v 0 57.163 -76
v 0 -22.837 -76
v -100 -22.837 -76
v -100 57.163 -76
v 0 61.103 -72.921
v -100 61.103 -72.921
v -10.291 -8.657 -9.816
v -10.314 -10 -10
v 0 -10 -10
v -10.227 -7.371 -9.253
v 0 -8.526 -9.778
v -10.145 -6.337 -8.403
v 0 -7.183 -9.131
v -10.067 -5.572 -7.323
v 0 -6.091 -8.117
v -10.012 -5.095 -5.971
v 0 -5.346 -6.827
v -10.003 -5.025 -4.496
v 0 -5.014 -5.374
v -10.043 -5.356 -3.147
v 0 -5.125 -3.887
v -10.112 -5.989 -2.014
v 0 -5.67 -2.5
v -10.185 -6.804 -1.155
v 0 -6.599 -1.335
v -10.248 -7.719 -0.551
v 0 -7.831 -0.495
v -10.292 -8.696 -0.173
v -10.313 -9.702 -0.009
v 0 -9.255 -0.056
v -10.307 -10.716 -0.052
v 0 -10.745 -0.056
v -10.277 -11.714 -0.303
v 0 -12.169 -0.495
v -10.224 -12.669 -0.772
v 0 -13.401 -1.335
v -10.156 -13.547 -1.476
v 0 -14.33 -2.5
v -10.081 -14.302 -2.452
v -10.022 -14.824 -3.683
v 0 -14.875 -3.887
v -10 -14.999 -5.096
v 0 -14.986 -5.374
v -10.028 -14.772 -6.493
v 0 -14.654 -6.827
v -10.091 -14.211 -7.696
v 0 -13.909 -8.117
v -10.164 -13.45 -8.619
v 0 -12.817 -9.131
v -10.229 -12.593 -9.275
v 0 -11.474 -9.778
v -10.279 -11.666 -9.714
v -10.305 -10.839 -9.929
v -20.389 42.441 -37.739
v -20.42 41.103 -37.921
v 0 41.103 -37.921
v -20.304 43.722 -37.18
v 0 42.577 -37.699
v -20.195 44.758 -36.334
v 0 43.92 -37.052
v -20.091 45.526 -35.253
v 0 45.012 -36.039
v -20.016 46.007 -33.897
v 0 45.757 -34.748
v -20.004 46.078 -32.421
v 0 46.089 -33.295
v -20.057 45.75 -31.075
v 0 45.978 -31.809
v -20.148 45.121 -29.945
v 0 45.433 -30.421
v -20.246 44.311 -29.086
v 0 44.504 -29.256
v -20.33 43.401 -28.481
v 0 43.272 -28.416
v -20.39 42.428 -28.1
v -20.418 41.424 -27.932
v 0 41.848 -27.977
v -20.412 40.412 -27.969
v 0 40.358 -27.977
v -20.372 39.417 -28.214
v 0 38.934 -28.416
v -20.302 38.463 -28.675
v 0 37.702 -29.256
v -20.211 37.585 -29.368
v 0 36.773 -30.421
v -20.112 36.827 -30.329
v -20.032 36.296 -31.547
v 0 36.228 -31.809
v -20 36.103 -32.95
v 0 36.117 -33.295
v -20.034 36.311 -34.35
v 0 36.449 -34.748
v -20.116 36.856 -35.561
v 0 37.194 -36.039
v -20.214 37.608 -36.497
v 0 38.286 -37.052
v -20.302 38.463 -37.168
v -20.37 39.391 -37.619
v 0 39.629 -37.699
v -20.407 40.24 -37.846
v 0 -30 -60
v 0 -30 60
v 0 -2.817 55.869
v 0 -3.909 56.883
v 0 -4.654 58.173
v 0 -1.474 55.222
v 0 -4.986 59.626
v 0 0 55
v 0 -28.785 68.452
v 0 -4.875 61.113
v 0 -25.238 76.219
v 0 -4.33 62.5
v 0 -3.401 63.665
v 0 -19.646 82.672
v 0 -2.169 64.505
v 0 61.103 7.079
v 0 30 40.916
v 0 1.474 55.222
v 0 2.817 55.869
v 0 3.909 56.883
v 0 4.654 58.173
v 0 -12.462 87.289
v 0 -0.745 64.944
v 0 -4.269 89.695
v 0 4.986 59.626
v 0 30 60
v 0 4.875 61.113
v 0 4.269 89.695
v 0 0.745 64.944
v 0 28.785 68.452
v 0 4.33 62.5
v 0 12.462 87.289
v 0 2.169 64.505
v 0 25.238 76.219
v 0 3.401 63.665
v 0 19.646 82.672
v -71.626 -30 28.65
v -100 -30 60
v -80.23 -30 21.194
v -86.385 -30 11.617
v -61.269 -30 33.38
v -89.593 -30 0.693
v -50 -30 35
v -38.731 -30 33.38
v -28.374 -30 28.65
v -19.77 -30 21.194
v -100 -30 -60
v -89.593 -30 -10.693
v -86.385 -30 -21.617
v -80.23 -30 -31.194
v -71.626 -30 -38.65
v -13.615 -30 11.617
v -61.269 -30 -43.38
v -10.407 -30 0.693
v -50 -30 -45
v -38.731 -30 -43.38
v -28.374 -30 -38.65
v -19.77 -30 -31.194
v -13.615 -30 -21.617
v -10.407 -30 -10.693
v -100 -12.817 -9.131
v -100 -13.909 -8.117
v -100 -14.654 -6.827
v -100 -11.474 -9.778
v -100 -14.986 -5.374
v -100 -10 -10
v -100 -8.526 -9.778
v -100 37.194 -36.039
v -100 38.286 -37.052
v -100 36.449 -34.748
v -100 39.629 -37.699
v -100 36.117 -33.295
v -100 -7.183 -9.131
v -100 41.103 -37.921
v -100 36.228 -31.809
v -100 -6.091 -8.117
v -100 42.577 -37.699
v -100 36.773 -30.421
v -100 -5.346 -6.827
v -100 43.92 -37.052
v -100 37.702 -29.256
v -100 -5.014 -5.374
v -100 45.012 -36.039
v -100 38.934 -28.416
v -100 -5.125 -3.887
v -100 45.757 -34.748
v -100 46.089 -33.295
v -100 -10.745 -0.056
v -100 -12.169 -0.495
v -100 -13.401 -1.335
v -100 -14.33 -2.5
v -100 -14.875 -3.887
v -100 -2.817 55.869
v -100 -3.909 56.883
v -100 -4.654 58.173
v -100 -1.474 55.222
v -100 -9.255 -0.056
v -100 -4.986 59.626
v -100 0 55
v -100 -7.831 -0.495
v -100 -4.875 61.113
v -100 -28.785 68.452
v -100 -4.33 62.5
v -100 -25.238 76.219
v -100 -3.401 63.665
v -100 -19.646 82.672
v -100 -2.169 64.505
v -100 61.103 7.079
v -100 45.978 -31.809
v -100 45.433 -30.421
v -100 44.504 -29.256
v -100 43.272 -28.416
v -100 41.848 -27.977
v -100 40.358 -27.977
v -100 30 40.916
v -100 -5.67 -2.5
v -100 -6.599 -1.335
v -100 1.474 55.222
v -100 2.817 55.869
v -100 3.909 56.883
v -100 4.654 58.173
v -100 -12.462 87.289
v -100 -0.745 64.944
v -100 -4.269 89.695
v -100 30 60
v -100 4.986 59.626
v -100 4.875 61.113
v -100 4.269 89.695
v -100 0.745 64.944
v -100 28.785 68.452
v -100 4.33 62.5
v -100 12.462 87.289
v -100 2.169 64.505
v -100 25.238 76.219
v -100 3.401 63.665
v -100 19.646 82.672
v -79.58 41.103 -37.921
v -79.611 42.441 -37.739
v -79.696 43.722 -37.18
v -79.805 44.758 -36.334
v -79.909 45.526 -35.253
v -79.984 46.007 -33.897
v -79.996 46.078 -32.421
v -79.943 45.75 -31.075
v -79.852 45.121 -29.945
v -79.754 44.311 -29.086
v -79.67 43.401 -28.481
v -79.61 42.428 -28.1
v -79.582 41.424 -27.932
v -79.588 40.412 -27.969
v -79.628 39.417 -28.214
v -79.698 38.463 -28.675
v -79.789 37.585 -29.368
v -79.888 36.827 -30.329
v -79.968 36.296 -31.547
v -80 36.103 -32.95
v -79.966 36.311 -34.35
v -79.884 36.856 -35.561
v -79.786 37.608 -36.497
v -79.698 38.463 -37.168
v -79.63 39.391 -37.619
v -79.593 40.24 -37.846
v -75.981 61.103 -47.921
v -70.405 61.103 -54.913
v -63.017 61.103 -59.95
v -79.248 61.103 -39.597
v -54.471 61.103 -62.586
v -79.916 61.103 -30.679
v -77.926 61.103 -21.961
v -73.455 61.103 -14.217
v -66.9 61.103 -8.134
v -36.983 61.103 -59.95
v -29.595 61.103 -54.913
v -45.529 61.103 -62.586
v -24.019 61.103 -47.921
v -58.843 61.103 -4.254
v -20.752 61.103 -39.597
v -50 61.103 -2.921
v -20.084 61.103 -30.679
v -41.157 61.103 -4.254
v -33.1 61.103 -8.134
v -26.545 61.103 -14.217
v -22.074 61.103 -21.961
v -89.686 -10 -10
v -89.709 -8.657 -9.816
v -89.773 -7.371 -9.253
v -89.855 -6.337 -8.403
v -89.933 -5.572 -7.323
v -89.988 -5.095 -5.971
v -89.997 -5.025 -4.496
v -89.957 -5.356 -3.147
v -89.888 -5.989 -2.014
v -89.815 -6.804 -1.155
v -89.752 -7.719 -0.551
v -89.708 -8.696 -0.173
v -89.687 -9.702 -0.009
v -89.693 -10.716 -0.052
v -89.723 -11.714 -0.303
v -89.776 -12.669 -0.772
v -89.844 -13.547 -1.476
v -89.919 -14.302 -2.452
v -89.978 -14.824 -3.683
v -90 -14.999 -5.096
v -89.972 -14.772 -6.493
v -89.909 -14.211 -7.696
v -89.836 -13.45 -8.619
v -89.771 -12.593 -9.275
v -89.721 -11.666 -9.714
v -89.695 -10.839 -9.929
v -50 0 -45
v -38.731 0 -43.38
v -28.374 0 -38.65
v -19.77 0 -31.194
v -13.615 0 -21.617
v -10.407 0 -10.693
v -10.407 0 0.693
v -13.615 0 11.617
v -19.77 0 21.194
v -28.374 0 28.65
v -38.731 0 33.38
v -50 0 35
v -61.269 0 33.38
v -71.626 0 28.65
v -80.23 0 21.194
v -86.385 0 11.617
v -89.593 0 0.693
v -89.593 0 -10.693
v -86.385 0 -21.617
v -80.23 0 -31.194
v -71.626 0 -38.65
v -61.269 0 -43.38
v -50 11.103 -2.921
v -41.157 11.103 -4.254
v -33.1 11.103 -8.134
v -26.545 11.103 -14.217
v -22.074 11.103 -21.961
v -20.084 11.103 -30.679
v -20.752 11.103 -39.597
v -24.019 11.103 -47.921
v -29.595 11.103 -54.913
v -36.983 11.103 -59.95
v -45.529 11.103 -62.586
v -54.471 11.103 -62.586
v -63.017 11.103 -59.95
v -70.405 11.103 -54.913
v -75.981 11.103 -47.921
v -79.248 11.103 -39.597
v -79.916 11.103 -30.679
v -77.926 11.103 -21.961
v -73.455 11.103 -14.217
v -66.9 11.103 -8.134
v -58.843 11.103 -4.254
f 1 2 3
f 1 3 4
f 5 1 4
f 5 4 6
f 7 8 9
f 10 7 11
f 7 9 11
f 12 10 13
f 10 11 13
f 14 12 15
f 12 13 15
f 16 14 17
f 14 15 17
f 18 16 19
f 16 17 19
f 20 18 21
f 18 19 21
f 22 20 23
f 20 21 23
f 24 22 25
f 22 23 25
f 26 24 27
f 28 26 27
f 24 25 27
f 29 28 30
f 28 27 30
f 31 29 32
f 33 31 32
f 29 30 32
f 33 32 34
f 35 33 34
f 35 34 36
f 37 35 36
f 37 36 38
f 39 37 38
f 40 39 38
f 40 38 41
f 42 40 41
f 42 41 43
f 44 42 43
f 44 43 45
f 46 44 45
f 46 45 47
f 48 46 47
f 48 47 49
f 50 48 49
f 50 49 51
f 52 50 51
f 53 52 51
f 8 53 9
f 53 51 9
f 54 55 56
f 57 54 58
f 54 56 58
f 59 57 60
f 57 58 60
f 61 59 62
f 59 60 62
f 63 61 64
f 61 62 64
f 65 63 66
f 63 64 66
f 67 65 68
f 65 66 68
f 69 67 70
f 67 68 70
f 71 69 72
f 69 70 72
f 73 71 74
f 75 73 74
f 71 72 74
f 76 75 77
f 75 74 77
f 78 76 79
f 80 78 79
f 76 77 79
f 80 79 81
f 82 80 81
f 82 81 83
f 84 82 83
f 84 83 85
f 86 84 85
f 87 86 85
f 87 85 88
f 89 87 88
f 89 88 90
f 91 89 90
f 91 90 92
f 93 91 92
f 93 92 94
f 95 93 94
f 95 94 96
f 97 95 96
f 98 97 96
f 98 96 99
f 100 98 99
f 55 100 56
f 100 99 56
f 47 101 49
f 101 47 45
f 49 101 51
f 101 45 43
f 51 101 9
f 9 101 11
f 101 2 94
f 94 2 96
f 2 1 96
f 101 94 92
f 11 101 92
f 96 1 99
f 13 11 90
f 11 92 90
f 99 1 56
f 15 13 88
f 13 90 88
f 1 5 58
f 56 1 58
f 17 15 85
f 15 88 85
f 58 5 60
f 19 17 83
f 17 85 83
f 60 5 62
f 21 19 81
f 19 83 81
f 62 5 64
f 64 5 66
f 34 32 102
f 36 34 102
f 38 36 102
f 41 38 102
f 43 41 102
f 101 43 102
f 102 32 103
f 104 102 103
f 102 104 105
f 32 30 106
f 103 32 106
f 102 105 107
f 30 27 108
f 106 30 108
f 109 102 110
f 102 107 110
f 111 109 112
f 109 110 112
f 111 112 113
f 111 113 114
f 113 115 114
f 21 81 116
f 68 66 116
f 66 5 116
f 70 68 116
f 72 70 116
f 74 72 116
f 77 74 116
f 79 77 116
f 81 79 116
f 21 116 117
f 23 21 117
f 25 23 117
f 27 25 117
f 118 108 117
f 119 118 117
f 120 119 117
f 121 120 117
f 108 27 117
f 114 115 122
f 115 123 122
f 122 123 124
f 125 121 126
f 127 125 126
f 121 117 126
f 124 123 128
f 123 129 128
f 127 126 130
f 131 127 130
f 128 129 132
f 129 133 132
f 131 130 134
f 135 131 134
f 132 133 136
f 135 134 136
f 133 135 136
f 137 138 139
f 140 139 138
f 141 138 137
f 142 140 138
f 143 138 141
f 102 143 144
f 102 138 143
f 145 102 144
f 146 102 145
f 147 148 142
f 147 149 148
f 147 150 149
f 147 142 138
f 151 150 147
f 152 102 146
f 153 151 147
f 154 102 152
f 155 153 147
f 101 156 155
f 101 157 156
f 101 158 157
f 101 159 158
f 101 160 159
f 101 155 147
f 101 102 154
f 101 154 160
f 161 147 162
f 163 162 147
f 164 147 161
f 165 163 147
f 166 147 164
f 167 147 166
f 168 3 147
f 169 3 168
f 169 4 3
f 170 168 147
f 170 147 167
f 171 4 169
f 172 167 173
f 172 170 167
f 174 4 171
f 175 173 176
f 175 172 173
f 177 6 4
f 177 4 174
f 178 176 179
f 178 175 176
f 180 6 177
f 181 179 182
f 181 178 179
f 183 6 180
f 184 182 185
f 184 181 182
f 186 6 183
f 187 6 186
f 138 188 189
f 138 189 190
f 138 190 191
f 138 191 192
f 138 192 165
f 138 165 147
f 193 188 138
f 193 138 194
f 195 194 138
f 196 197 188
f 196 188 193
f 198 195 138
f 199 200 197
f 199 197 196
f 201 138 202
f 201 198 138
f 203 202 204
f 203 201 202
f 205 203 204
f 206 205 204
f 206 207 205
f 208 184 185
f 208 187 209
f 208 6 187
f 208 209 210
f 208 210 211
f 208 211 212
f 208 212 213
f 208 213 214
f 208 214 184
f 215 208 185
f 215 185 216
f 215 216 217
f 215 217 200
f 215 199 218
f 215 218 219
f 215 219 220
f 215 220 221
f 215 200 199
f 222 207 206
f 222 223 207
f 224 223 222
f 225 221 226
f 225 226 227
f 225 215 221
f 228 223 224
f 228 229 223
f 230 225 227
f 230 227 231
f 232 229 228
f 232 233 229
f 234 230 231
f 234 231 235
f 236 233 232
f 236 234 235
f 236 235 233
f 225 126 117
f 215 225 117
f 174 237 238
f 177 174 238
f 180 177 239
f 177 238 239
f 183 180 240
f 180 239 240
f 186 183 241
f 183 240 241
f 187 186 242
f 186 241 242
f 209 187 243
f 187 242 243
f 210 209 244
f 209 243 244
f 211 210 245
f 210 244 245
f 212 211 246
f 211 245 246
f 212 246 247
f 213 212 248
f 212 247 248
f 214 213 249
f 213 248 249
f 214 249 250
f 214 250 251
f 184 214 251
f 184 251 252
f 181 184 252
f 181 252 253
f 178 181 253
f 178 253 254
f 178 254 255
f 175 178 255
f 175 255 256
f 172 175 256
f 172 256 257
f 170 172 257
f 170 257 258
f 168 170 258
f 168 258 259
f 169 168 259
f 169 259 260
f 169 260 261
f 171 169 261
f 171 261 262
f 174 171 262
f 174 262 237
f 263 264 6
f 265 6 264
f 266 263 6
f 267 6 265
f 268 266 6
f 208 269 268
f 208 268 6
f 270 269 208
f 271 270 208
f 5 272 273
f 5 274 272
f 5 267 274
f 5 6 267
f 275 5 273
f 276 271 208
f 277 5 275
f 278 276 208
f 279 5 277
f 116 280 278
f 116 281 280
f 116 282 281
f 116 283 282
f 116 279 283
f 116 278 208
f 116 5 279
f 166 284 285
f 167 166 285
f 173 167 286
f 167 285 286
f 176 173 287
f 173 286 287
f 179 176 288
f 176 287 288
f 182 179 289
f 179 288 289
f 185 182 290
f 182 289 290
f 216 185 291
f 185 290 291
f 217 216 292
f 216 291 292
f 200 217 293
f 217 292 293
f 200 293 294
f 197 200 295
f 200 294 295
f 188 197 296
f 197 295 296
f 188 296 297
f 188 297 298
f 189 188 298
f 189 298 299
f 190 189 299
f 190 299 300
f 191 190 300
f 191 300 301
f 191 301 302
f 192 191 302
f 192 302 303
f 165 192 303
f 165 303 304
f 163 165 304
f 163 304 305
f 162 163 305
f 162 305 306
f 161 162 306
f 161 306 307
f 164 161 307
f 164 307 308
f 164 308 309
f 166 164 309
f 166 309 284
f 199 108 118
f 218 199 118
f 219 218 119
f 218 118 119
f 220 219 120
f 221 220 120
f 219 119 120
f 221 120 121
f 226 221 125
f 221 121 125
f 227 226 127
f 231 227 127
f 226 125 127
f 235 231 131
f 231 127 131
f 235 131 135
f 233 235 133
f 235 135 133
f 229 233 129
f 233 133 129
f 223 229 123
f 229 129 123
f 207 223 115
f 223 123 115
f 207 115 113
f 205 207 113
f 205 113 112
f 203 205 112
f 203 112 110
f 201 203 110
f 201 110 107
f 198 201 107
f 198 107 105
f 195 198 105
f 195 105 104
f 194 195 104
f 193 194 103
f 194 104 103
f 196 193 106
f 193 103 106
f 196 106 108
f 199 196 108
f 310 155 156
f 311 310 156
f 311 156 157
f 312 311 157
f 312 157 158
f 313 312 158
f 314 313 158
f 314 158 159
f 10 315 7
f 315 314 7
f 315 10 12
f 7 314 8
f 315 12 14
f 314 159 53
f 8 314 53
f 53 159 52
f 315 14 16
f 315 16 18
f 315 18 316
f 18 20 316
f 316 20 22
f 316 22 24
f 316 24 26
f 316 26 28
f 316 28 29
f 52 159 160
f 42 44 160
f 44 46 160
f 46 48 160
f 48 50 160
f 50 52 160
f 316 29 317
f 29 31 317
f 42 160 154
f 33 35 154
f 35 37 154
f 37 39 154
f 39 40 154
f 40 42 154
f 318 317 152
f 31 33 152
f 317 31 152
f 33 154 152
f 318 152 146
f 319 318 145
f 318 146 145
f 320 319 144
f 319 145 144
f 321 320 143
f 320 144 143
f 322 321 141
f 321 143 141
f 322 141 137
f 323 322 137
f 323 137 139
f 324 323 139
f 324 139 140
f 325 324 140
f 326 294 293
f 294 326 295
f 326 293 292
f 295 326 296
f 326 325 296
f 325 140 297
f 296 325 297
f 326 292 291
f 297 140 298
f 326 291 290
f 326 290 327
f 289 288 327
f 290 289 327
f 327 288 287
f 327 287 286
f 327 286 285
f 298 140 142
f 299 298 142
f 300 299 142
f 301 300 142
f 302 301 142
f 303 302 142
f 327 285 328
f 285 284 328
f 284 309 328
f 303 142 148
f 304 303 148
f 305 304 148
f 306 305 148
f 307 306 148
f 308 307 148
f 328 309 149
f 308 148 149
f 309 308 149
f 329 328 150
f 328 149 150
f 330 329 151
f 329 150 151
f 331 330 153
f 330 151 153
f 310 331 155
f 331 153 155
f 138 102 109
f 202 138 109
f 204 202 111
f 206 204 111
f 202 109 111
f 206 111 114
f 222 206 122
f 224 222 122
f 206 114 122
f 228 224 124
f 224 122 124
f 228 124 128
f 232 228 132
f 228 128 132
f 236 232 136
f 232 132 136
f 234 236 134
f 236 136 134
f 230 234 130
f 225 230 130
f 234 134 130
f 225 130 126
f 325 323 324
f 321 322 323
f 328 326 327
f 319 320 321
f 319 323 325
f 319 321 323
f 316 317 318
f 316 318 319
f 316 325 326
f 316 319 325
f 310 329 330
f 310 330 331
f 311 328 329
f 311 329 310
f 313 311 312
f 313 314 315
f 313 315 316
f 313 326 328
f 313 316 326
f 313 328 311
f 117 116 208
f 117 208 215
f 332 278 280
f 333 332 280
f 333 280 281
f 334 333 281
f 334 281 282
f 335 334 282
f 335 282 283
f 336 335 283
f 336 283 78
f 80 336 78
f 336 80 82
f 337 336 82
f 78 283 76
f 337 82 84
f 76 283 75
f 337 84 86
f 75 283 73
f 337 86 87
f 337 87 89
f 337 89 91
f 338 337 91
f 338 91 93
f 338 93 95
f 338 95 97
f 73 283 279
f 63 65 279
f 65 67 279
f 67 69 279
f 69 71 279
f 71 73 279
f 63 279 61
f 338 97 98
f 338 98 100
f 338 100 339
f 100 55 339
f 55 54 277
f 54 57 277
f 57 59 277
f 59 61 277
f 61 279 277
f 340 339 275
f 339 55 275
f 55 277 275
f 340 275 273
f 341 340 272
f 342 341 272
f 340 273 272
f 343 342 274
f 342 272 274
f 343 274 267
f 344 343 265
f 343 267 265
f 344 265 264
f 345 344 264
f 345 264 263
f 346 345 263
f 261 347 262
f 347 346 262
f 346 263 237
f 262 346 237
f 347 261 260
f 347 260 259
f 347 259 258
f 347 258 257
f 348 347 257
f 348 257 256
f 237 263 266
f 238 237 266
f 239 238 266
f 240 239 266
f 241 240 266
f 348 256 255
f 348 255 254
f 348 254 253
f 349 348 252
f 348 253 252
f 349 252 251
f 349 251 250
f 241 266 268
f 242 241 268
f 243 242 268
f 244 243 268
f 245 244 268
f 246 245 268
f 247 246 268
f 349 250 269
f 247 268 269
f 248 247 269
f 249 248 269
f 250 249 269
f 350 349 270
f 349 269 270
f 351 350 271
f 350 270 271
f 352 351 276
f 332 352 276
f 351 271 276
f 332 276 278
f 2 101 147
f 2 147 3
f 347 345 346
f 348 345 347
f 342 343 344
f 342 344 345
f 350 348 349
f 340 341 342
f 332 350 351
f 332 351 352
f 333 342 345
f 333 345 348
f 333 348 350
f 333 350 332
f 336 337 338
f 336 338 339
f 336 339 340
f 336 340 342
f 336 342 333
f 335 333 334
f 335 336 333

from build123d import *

# Parameters (mm, degrees)
SKETCH1_W           = 120
SKETCH1_H           = 60
BOSS_EXTRUDE1_DEPTH = 100
SKETCH2_R           = 40
CUT_EXTRUDE1_DEPTH  = 30
SKETCH3_R           = 5
CUT_EXTRUDE2_DEPTH  = 121.415945788
BOSS_EXTRUDE2_DEPTH = 100
SKETCH9_R           = 30
CUT_EXTRUDE6_DEPTH  = 50
SKETCH5_R           = 5
CUT_EXTRUDE3_DEPTH  = 100


with BuildPart() as part:
    # Sketch1 → Boss-Extrude1 (new body)
    with BuildSketch(Plane(origin=(0, 0, 0), x_dir=(0, 0, -1), z_dir=(1, 0, 0))):
        Rectangle(SKETCH1_W, SKETCH1_H)
    extrude(amount=-BOSS_EXTRUDE1_DEPTH)

    # Sketch2 → Cut-Extrude1 (cut)
    with BuildSketch(Plane.XZ.offset(30)):
        with Locations(Location((-50, -5, 0), (0, 0, 270))):
            Circle(SKETCH2_R)
    extrude(amount=-CUT_EXTRUDE1_DEPTH, mode=Mode.SUBTRACT)

    # Sketch3 → Cut-Extrude2 (cut, through all)
    with BuildSketch(Plane(origin=(0, 0, 0), x_dir=(0, 0, -1), z_dir=(1, 0, 0))):
        with Locations((5, -10)):
            Circle(SKETCH3_R)
    extrude(amount=-CUT_EXTRUDE2_DEPTH, mode=Mode.SUBTRACT)

    # Sketch4 → Boss-Extrude2 (add)
    with BuildSketch(Plane(origin=(0, 0, 0), x_dir=(0, 0, -1), z_dir=(1, 0, 0))):
        with BuildLine():
            Line((-60, 30), (-60, -30))
            ThreePointArc((-60, -30), (-90, 0), (-60, 30))
        make_face()
        Polygon((60, 30), (60, -30), (76, -22.836697104), (76, 57.163302896), (72.921242275, 61.103004772), (-7.078757725, 61.103004772), (-40.915642919, 30), align=None)
    extrude(amount=-BOSS_EXTRUDE2_DEPTH)

    # Sketch9 → Cut-Extrude6 (cut)
    with BuildSketch(Plane(origin=(0, 61.103004772, 0), x_dir=(1, 0, 0), z_dir=(0, 1, 0))):
        with Locations(Location((-50, 32.921242275, 0), (0, 0, 270))):
            Circle(SKETCH9_R)
    extrude(amount=-CUT_EXTRUDE6_DEPTH, mode=Mode.SUBTRACT)

    # Sketch5 → Cut-Extrude3 (cut)
    with BuildSketch(Plane(origin=(0, 0, 0), x_dir=(0, 0, -1), z_dir=(1, 0, 0))):
        with Locations((-60, 0)):
            Circle(SKETCH5_R)
        with Locations((32.921242275, 41.103004772)):
            Circle(SKETCH5_R)
    extrude(amount=-CUT_EXTRUDE3_DEPTH, mode=Mode.SUBTRACT)


solid = part.part
